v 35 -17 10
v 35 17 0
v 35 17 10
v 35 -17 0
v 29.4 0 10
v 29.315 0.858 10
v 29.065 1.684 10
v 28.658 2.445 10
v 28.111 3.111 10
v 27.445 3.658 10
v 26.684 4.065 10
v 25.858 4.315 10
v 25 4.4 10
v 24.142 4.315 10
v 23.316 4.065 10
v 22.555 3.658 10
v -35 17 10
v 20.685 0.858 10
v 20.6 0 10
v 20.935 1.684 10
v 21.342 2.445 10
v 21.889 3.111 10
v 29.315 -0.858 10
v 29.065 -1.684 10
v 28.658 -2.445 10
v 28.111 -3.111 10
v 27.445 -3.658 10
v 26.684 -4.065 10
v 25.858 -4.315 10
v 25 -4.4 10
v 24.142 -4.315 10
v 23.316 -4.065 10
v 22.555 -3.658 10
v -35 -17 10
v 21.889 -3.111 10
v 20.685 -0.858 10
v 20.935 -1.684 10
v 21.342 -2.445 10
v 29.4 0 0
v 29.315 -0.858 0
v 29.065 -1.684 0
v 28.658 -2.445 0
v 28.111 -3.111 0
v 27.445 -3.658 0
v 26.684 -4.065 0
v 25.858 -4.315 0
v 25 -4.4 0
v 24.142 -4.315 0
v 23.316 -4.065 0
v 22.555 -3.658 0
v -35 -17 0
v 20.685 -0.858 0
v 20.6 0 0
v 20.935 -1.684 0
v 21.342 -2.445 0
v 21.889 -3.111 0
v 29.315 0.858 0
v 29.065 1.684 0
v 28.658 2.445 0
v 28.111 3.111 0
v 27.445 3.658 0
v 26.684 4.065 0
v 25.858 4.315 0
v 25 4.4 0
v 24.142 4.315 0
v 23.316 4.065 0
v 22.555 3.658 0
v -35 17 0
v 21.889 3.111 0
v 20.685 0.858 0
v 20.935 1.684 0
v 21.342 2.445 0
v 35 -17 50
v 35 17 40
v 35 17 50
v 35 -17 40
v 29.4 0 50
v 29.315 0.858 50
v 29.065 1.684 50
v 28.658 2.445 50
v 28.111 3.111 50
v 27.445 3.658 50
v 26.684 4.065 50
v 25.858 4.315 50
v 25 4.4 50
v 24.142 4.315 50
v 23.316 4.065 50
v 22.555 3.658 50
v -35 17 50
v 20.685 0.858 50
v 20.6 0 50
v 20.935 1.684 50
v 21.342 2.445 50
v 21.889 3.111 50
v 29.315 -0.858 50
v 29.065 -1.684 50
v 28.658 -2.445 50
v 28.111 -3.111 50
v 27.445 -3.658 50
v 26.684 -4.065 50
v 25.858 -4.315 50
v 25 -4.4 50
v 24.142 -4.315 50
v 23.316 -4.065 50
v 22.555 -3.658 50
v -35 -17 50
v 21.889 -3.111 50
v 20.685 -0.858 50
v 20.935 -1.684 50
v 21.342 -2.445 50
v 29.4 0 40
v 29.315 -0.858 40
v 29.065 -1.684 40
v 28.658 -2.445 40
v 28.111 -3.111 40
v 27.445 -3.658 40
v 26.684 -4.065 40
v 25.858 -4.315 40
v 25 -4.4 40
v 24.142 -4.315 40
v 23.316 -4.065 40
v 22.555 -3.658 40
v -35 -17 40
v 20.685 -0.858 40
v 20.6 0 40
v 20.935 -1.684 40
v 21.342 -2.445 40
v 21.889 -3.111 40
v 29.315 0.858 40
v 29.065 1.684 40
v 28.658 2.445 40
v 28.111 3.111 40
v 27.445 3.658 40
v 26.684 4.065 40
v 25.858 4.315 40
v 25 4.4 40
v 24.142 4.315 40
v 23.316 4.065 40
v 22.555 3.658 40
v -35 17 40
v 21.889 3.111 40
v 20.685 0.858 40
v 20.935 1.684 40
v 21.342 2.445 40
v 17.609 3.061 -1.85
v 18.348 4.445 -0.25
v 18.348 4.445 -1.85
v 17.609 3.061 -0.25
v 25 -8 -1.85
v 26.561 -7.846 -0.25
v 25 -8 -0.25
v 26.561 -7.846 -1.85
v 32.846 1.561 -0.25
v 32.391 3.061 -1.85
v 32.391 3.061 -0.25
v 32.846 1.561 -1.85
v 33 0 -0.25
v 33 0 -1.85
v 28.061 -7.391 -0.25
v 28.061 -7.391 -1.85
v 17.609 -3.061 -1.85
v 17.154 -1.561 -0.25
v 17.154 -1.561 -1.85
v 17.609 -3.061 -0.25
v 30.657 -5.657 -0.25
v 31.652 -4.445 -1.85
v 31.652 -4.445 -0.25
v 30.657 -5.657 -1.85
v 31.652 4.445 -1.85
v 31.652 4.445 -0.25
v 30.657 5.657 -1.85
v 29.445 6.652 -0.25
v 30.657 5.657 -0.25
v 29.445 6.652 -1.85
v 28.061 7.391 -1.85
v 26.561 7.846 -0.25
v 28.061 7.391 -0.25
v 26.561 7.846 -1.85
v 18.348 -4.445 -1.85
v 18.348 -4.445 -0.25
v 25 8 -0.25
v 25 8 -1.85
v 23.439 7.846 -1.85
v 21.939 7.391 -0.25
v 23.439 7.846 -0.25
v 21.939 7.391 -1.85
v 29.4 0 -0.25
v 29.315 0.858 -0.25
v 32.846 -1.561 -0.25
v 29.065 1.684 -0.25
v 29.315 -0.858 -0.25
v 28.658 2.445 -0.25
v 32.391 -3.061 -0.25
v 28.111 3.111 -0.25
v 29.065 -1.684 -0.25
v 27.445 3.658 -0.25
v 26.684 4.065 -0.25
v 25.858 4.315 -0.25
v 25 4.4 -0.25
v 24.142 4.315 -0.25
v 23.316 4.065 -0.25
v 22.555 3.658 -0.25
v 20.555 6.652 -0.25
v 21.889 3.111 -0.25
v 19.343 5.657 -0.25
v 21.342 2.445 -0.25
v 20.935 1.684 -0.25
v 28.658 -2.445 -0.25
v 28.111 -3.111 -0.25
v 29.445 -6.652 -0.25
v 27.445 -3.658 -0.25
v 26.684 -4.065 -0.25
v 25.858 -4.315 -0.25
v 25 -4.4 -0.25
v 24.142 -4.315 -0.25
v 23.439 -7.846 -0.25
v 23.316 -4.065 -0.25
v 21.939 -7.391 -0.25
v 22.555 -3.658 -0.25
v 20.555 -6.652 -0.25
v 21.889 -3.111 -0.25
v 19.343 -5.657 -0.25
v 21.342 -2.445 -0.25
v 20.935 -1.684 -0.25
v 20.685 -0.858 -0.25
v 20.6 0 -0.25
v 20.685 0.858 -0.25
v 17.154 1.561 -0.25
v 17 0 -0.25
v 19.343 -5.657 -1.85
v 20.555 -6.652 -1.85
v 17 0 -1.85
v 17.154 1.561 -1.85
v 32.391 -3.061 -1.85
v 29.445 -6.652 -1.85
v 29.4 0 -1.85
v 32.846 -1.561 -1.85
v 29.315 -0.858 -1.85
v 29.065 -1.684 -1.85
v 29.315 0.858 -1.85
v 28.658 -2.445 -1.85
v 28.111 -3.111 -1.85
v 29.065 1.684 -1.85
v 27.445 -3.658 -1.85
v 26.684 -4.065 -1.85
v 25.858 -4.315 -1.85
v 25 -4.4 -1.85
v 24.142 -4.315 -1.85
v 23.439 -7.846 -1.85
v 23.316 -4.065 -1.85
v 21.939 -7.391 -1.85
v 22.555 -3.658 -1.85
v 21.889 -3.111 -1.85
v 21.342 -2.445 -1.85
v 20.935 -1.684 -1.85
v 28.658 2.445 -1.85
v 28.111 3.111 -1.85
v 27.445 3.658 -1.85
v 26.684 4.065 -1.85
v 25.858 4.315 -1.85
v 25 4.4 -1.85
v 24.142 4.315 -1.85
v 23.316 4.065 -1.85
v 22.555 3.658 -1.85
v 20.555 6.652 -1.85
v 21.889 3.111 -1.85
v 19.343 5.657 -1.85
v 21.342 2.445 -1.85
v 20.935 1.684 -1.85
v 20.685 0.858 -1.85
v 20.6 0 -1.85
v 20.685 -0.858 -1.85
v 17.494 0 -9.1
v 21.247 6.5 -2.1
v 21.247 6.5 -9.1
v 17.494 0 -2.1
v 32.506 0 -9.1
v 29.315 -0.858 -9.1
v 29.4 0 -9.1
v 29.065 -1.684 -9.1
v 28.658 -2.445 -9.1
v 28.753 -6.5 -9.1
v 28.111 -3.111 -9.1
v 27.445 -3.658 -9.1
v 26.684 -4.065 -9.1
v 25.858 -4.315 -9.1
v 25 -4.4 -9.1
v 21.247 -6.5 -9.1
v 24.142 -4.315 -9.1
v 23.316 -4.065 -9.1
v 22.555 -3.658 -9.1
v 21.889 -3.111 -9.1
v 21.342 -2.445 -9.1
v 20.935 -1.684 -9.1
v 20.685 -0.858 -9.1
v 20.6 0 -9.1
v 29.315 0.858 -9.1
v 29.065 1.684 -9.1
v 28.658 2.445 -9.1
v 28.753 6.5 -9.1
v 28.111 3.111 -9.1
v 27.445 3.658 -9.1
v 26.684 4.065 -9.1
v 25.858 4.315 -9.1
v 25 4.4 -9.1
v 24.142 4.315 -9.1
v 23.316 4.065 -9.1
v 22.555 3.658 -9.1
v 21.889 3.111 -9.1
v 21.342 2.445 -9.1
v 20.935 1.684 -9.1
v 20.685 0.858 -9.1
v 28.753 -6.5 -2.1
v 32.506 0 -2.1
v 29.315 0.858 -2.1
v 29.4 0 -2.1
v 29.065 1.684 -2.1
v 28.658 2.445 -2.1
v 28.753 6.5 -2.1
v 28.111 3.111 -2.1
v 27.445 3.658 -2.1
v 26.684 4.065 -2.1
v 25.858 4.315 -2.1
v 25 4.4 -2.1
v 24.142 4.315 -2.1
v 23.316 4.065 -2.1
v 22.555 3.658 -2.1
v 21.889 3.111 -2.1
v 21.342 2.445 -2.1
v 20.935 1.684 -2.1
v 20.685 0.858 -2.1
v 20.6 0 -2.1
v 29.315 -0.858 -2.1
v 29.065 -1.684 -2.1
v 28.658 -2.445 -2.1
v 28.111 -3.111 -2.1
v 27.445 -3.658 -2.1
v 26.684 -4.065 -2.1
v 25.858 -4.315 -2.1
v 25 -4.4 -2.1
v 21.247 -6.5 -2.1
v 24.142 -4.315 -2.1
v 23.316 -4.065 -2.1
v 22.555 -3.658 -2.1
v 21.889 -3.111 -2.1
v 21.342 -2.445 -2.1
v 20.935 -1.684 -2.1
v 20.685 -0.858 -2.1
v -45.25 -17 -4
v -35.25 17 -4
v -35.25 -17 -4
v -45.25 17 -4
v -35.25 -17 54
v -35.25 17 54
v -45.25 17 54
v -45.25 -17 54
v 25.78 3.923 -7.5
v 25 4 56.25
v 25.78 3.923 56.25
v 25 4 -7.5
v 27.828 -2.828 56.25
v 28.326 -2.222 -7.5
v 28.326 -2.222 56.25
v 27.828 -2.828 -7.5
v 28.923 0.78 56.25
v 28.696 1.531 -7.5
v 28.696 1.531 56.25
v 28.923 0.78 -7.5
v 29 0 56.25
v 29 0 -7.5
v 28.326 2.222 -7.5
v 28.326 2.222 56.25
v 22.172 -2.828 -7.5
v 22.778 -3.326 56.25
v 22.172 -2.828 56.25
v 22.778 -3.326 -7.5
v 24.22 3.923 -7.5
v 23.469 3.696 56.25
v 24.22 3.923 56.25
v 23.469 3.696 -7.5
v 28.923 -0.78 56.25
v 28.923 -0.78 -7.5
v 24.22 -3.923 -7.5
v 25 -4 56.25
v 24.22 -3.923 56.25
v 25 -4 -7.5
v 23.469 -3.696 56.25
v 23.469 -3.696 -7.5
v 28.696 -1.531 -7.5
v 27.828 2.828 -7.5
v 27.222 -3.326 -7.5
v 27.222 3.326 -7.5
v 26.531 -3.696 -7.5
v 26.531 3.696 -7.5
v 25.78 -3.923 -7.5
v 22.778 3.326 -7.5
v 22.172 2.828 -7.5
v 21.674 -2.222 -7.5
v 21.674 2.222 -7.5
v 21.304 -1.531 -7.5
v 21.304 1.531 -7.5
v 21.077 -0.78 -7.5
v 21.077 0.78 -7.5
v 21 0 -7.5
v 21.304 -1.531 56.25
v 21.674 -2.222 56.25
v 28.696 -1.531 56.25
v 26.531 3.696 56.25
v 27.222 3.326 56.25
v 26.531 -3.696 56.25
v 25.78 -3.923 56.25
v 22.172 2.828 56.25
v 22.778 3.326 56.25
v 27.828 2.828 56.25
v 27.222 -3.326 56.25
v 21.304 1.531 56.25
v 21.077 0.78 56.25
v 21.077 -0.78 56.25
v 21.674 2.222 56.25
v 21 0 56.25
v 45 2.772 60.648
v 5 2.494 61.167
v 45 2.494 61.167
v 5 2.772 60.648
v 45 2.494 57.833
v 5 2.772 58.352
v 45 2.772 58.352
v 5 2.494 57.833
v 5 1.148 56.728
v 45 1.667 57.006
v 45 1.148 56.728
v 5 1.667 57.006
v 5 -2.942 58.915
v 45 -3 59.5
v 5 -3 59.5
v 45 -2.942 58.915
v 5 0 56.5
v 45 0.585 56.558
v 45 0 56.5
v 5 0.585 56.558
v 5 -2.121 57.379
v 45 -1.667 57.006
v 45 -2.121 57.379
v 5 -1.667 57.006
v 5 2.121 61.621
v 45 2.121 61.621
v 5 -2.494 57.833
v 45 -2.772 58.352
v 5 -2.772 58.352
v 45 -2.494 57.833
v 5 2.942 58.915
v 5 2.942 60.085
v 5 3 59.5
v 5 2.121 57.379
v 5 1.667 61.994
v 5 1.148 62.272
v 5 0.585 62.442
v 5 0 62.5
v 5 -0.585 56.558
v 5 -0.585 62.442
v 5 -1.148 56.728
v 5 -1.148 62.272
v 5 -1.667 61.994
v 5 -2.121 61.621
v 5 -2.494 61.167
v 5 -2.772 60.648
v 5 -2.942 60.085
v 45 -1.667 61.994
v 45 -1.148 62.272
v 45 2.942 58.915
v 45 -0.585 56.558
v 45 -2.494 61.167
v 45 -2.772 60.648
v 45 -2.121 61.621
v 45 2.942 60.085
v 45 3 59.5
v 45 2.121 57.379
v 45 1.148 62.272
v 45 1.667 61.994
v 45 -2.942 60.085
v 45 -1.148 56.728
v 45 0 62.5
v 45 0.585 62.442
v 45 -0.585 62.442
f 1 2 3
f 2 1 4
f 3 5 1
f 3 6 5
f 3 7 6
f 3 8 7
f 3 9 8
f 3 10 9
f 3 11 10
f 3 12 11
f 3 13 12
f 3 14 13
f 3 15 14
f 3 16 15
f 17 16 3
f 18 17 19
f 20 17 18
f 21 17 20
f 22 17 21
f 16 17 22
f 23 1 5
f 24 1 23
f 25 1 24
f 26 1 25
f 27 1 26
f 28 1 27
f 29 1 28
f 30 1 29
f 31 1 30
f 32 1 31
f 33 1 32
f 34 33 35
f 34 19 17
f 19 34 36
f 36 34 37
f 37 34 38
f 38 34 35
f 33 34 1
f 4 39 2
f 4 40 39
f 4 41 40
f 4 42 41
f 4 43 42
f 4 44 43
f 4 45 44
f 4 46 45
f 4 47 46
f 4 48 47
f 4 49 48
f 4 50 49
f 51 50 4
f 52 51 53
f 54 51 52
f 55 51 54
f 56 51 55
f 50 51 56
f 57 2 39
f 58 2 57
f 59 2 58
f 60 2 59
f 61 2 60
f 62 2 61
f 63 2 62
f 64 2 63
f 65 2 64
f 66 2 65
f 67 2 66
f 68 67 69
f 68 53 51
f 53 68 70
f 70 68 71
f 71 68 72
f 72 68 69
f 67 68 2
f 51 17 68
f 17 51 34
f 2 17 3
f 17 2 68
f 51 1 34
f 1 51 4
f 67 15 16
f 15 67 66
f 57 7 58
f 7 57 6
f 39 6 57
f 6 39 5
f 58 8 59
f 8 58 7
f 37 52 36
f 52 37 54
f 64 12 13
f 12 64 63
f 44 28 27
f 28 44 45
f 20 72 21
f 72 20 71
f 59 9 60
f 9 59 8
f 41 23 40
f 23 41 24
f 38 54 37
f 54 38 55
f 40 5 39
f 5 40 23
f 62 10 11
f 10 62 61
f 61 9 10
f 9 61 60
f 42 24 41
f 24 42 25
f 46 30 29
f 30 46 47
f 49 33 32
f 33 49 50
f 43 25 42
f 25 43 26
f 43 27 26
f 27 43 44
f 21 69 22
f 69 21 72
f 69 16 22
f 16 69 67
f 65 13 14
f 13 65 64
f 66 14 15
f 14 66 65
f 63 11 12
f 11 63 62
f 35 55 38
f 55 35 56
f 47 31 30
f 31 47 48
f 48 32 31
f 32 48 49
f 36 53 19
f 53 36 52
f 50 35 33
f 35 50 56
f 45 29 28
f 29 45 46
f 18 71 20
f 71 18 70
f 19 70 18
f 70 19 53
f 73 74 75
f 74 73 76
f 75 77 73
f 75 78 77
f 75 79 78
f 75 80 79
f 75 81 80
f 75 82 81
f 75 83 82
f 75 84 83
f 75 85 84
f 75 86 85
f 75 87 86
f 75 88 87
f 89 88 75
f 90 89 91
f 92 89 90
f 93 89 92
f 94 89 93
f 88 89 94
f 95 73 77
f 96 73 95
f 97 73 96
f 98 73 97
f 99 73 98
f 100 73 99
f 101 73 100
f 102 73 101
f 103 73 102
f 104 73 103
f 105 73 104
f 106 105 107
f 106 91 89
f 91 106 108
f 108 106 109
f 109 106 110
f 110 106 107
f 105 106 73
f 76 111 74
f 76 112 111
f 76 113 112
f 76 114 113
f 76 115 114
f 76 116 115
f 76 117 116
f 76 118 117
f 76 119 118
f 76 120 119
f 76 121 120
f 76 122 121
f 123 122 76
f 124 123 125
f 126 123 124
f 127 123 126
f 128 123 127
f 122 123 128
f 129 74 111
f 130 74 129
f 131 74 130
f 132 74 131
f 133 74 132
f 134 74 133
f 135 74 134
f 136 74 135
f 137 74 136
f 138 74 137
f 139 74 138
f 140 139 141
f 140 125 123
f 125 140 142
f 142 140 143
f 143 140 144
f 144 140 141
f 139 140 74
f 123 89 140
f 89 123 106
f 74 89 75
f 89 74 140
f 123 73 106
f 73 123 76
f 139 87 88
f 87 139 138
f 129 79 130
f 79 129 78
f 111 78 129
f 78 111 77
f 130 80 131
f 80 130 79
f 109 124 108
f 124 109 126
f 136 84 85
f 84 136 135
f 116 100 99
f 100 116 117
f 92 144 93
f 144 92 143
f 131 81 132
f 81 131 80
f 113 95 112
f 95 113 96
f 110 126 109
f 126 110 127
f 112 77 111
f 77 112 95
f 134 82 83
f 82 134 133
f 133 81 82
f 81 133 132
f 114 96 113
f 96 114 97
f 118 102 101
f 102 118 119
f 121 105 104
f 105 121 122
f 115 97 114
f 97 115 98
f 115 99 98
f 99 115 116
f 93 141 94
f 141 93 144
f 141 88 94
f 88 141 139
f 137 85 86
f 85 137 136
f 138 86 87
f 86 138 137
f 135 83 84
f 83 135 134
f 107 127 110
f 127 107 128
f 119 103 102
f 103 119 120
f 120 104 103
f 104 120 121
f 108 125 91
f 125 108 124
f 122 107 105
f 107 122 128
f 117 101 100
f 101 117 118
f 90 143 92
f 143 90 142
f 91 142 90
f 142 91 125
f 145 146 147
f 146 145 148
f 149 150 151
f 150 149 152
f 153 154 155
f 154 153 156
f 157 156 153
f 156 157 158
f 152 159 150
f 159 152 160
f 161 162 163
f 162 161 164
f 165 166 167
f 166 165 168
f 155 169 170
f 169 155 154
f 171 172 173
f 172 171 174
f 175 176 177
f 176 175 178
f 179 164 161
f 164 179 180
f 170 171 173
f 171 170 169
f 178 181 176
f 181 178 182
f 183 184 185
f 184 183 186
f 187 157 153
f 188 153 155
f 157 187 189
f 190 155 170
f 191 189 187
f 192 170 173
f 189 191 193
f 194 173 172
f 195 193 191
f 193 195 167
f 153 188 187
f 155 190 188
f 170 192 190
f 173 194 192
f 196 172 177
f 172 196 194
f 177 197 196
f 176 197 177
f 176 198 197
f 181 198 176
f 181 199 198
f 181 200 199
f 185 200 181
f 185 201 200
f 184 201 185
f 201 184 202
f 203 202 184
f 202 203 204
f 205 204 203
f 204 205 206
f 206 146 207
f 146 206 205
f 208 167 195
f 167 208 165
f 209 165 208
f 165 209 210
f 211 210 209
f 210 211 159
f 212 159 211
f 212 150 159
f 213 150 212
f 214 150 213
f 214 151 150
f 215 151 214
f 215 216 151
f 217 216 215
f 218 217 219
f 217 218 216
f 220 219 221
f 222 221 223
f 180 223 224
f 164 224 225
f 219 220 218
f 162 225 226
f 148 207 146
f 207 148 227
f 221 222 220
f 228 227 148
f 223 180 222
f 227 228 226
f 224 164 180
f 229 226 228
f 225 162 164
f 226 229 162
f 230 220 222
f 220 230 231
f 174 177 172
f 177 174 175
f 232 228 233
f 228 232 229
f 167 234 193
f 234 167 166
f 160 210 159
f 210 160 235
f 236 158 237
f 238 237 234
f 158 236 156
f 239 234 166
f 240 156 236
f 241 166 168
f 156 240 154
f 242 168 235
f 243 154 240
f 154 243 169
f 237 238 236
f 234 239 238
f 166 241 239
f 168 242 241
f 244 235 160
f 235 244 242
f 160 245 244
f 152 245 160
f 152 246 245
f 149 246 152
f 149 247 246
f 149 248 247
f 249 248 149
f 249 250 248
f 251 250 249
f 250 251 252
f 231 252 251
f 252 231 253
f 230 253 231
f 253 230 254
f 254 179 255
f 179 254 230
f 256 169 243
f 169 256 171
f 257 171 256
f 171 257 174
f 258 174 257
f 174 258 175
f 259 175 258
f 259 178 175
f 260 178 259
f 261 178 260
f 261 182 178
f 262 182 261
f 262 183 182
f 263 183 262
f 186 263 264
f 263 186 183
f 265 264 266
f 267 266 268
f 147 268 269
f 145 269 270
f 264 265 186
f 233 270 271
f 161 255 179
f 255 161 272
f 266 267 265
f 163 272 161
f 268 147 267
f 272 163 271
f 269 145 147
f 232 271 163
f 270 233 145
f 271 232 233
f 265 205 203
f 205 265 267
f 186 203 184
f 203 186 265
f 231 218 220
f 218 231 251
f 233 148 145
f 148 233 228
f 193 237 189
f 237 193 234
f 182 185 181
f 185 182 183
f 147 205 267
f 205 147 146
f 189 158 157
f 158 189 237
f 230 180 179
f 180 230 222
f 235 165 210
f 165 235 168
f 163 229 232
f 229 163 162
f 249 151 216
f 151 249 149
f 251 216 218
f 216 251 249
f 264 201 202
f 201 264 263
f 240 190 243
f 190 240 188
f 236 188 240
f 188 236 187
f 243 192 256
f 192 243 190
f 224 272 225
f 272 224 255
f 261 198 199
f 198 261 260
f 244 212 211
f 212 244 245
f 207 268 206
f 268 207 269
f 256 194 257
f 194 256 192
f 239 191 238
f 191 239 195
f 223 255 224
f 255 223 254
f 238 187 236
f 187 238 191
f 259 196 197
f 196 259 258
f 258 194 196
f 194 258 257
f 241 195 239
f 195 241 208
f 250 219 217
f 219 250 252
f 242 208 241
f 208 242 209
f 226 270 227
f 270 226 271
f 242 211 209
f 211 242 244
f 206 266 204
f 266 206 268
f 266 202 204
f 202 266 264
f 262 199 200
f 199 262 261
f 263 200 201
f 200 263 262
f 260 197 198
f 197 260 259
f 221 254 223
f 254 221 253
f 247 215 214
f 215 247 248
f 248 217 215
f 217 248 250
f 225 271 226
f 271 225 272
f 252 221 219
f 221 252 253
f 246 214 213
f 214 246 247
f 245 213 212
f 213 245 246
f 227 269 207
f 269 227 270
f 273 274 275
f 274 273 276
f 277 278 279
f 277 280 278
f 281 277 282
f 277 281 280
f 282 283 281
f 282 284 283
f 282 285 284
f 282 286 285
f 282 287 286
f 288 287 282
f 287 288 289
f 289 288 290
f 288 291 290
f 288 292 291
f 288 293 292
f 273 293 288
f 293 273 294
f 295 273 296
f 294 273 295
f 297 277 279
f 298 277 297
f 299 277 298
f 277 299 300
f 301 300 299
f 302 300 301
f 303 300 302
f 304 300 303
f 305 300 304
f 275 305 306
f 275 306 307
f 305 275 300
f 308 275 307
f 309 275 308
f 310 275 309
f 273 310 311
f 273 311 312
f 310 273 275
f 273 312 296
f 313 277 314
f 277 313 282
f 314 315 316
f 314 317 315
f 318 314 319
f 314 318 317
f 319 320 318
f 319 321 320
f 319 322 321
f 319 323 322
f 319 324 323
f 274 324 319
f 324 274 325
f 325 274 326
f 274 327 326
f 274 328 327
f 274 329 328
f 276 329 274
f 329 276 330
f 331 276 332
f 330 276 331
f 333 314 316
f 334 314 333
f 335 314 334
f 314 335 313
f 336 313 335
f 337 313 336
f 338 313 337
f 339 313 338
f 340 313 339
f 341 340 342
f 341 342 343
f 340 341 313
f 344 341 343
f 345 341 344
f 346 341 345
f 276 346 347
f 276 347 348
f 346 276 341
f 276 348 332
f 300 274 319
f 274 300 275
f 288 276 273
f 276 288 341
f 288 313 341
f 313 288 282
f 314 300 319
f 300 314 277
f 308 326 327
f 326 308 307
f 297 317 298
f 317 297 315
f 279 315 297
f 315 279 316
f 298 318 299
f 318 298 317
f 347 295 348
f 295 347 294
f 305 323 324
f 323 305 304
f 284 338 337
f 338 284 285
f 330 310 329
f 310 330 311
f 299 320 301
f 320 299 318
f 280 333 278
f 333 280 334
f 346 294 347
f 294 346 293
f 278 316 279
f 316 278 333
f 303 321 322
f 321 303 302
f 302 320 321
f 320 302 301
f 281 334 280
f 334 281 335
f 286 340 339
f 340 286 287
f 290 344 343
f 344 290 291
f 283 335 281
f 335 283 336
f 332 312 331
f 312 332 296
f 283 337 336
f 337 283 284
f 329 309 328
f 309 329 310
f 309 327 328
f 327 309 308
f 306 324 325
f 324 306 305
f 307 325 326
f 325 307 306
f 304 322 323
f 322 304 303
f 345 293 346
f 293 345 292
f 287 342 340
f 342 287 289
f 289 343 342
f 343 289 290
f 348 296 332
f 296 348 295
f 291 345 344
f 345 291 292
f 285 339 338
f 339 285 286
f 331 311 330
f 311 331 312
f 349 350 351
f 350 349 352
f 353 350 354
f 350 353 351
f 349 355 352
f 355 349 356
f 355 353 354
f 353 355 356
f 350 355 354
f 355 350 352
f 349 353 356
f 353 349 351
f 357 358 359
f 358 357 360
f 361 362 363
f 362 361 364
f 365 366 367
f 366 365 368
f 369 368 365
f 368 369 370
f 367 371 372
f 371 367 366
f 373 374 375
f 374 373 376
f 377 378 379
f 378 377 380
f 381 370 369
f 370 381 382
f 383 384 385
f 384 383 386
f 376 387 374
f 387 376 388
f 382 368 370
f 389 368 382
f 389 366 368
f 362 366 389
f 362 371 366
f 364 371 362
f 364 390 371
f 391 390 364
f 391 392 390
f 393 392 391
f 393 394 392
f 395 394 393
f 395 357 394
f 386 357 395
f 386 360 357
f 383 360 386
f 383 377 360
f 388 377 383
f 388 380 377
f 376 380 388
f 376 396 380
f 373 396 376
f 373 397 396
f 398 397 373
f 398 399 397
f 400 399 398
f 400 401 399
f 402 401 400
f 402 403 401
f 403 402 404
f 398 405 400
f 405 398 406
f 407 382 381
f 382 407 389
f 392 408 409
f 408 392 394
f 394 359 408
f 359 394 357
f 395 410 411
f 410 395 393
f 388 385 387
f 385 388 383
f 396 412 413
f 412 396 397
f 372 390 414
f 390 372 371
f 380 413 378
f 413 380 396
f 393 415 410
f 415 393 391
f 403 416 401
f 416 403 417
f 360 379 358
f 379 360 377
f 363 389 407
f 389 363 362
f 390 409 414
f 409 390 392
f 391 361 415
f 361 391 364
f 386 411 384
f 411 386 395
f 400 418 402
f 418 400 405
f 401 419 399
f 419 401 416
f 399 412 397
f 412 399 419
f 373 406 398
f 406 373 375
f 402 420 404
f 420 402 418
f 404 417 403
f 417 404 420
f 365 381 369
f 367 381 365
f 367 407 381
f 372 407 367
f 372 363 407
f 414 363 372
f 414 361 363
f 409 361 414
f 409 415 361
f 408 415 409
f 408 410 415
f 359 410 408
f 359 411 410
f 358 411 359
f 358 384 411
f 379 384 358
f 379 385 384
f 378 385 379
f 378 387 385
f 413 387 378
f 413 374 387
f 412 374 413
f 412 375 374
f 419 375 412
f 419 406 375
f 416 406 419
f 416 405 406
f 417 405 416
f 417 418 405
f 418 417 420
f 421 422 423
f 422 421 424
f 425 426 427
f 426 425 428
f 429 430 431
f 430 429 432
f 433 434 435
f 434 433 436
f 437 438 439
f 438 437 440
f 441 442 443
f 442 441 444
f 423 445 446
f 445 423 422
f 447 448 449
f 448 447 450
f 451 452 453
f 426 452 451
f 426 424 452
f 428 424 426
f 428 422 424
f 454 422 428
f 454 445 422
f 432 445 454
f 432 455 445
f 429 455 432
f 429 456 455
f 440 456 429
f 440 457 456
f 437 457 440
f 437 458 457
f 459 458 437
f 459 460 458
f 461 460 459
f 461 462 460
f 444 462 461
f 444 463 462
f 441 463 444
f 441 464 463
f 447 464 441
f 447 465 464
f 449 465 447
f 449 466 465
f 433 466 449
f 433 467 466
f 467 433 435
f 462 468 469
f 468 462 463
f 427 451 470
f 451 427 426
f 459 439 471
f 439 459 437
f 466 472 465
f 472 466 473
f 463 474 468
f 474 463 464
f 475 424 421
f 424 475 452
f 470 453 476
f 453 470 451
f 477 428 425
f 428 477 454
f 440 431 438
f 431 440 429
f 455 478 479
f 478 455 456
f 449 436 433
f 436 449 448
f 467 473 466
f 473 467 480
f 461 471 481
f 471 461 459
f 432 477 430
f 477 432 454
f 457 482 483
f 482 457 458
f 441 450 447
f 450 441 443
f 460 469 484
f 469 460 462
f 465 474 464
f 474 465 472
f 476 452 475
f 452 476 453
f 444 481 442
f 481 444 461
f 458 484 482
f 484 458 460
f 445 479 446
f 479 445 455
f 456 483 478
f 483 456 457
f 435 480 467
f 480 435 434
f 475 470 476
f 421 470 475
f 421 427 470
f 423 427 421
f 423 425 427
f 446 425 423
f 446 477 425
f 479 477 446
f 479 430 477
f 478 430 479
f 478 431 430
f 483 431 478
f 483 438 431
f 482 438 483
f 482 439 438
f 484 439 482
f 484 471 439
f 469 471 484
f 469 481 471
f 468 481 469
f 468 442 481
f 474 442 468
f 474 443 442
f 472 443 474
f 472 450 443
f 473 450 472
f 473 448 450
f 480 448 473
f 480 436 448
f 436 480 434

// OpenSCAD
$fn = 32;

// ------------------------------------------------------------------------
// C clamp: throat 40 mm, screw d8
// Every part is its own module, assembly() places every instance.
// ------------------------------------------------------------------------

// --- part 1 ---
module clamp_arm() {
  difference() {
    translate([-35, -17, 0]) cube([70, 34, 10]);
    translate([25, 0, -1]) cylinder(h = 12, d = 8.8);
  }
}

// --- part 2 ---
module clamp_spine() {
  difference() {
    translate([-29, -17, 0]) cube([58, 34, 10]);
  }
}

// --- part 3 ---
module clamp_screw() {
  translate([0, 0, -31.875]) cylinder(h = 63.75, d = 8);
}

// --- part 4 ---
module clamp_washer() {
  difference() {
      translate([0, 0, 0]) cylinder(h = 1.6, d = 16);
      translate([0, 0, -1]) cylinder(h = 3.6, d = 8.8);
    }
}

// --- part 5 ---
module clamp_nut() {
  difference() {
    linear_extrude(height = 7) polygon(points = [[7.506, 0], [3.753, 6.5], [-3.753, 6.5], [-7.506, 0], [-3.753, -6.5], [3.753, -6.5]]);
    translate([0, 0, -1]) cylinder(h = 9, d = 8.8);
  }
}

// --- part 6 ---
module tommy_bar() {
  translate([0, 0, -20]) cylinder(h = 40, d = 6);
}

// --- assembly ---
module assembly() {
  color([0.80, 0.24, 0.20]) translate([0, 0, 0]) rotate([0, 0, 0]) clamp_arm();
  color([0.20, 0.45, 0.75]) translate([0, 0, 40]) rotate([0, 0, 0]) clamp_arm();
  color([0.25, 0.62, 0.32]) translate([-45.25, 0, 25]) rotate([0, 90, 0]) clamp_spine();
  color([0.92, 0.70, 0.18]) translate([25, 0, 24.375]) rotate([0, 0, 0]) clamp_screw();
  color([0.58, 0.35, 0.70]) translate([25, 0, -1.85]) rotate([0, 0, 0]) clamp_washer();
  color([0.16, 0.66, 0.66]) translate([25, 0, -9.1]) rotate([0, 0, 0]) clamp_nut();
  color([0.85, 0.48, 0.18]) translate([25, 0, 59.5]) rotate([0, 90, 0]) tommy_bar();
}

assembly();
